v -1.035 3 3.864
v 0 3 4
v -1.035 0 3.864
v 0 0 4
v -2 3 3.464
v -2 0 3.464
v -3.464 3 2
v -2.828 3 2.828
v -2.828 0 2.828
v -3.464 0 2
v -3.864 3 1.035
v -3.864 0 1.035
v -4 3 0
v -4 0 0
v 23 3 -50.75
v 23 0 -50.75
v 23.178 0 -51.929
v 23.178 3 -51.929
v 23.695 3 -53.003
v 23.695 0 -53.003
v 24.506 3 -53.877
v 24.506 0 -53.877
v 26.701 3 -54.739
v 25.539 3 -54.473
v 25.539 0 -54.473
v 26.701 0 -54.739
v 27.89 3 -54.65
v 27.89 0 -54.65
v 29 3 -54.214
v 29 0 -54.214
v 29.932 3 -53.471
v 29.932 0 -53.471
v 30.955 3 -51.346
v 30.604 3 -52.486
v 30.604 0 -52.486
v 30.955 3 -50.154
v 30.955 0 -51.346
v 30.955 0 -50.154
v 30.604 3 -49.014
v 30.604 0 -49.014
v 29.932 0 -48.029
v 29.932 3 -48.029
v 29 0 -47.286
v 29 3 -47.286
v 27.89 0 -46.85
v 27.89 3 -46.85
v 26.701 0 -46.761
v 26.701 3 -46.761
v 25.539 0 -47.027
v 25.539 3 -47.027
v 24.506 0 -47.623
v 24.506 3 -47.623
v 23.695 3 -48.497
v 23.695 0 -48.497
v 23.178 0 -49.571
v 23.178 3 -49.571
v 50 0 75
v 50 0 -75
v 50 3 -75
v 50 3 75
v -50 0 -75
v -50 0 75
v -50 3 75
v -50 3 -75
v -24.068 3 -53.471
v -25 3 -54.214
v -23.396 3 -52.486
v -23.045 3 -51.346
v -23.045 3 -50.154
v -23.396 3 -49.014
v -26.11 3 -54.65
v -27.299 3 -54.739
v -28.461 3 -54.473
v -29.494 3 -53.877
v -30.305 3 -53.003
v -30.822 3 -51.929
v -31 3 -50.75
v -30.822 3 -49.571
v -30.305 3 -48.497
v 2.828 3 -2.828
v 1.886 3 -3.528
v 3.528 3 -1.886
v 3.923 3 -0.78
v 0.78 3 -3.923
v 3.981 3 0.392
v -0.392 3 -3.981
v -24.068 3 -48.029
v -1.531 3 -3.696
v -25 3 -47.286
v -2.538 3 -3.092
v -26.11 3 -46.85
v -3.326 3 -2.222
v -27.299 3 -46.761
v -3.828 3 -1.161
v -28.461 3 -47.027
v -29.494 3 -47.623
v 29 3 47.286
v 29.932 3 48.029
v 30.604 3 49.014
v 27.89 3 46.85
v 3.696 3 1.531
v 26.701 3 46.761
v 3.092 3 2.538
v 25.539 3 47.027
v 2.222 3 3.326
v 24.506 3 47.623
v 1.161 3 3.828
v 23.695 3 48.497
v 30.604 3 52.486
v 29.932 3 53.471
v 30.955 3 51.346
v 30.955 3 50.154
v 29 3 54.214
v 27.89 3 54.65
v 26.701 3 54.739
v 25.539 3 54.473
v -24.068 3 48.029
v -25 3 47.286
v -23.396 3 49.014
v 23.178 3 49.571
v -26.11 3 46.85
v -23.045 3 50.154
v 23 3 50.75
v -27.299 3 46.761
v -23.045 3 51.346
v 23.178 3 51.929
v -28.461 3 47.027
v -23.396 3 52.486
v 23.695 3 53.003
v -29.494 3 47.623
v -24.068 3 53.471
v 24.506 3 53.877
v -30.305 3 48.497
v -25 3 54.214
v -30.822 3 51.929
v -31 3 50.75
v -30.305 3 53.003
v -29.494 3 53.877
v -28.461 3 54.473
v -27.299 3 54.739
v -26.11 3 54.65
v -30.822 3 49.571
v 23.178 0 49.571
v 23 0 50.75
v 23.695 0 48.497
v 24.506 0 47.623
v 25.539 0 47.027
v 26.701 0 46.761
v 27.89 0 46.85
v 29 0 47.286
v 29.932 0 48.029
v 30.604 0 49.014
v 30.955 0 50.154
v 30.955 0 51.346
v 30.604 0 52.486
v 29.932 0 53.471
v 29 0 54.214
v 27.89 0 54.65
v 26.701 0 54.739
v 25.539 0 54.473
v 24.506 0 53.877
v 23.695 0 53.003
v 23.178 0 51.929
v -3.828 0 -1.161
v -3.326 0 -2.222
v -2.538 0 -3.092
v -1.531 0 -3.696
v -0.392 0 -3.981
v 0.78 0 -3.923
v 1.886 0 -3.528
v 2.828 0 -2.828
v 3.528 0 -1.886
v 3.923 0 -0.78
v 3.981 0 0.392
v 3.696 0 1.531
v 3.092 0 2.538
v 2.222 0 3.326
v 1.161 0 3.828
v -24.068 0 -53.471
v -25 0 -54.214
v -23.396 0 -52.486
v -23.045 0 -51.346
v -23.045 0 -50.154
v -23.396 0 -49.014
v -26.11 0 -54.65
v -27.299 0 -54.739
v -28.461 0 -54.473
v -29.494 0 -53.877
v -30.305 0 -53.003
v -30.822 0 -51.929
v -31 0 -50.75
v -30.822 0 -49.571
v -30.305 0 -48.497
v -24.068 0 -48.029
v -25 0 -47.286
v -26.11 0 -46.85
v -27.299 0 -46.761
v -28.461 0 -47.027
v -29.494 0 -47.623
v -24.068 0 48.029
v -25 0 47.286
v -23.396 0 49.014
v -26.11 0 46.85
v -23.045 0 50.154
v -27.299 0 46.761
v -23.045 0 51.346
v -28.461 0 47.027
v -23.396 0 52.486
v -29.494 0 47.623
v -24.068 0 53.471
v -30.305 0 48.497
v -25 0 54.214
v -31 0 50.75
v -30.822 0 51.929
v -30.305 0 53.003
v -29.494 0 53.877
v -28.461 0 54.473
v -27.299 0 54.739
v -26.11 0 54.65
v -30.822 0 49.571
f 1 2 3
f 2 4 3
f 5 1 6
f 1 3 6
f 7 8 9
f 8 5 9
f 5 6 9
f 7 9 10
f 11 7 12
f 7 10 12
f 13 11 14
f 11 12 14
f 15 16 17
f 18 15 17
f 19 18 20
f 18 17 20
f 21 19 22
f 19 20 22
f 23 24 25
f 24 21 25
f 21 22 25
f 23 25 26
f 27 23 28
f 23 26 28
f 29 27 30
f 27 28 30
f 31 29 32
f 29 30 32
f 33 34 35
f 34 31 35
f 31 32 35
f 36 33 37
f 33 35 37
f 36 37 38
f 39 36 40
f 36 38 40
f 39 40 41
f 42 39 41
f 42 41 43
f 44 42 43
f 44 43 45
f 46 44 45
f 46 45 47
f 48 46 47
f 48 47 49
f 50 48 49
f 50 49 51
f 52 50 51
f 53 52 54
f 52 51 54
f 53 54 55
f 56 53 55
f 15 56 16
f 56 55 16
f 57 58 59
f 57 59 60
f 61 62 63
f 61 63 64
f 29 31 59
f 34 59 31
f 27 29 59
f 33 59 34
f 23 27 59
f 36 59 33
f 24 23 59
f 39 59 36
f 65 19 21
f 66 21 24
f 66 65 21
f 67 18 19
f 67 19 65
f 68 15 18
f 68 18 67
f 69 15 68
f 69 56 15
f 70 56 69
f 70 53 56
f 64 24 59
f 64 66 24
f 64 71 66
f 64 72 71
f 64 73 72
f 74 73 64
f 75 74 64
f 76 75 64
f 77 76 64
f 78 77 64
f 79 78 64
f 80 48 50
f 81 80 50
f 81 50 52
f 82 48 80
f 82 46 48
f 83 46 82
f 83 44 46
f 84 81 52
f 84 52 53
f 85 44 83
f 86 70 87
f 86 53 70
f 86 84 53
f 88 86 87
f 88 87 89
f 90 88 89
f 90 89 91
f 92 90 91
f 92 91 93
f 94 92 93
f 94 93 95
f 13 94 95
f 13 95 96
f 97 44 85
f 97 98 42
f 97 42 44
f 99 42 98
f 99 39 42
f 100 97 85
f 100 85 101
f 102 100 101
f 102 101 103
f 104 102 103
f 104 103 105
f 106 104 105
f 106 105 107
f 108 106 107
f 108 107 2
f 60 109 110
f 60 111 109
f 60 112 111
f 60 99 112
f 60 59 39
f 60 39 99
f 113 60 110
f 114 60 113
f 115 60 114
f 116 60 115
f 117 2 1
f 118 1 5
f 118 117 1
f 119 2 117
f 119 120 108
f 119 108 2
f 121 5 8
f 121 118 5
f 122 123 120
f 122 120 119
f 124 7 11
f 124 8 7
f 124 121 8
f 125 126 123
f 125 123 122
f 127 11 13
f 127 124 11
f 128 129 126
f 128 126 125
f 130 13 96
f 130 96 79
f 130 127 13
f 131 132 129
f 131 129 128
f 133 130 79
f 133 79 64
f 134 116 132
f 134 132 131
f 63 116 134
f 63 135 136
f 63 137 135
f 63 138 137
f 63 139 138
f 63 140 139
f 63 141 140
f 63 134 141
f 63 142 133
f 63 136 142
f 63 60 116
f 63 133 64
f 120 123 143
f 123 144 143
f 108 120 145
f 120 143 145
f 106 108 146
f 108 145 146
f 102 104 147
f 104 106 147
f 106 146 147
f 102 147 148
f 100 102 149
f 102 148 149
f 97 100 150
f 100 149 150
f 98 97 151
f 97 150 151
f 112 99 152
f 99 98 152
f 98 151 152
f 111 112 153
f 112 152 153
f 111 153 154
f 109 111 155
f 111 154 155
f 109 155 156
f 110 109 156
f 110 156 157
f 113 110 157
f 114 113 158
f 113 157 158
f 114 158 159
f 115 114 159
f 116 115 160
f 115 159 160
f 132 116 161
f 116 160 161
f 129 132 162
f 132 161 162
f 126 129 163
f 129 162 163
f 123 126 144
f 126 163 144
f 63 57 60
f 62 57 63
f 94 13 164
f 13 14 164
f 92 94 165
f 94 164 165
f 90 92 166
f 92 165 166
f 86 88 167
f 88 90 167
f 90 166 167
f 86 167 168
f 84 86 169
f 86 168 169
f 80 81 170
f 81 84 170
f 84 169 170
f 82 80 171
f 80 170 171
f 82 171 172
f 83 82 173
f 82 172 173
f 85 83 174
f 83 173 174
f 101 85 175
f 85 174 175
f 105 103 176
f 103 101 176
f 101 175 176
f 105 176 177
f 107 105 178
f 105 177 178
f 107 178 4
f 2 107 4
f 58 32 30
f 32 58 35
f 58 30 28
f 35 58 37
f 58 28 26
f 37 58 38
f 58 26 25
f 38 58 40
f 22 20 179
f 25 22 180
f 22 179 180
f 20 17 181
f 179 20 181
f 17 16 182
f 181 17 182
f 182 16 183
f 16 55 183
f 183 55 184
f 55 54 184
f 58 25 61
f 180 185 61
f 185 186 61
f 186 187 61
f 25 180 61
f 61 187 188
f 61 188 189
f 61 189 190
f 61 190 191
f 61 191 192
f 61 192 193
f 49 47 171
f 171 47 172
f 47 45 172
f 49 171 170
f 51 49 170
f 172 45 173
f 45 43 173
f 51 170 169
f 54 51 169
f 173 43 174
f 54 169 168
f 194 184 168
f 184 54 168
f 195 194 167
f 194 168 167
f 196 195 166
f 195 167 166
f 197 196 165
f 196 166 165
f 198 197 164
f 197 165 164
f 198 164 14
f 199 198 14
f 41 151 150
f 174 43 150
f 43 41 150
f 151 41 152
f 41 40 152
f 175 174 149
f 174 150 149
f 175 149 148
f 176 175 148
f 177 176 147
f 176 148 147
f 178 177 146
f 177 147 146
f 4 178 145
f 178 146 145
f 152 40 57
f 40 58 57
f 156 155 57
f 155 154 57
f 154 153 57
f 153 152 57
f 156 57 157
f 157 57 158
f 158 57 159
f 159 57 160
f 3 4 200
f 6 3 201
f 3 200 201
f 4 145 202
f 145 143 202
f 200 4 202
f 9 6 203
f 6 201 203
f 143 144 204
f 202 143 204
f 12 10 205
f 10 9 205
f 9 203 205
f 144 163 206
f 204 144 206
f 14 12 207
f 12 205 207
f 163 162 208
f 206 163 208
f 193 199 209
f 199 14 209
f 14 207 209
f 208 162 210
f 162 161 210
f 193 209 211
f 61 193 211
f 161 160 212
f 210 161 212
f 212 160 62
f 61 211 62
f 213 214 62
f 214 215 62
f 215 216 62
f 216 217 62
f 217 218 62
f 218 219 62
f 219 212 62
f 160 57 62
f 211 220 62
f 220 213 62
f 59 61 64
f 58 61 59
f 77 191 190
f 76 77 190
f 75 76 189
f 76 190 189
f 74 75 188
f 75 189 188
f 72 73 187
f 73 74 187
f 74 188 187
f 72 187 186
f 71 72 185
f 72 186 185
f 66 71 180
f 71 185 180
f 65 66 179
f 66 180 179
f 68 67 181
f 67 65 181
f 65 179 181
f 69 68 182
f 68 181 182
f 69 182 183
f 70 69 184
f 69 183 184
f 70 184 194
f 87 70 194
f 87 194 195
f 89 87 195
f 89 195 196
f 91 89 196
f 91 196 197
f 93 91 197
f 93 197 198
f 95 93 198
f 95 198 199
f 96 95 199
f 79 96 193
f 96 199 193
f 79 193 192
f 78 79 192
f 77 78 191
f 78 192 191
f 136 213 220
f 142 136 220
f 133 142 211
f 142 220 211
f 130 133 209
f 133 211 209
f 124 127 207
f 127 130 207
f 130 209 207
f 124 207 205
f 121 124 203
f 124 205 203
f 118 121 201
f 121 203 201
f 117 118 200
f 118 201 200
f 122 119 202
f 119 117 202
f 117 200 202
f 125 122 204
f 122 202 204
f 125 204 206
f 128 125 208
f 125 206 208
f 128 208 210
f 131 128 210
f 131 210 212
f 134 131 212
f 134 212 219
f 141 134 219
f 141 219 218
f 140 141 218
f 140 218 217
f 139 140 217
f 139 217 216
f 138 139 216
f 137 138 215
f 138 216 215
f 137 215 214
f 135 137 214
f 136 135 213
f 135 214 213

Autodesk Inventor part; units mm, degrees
ref_plane "YZ Plane" through (0, 0, 0) normal (1, 0, 0) x (0, 1, 0)
ref_plane "XZ Plane" through (0, 0, 0) normal (0, 1, 0) x (-1, 0, 0)
ref_plane "XY Plane" through (0, 0, 0) normal (0, 0, 1) x (1, 0, 0)
sketch "Sketch1" plane through (0, 0, 0) normal (0, 1, 0) x (-1, 0, 0)
  line L0 (-50, 75) -> (50, 75)
  line L1 (50, 75) -> (50, -75)
  line L2 (50, -75) -> (-50, -75)
  line L3 (-50, -75) -> (-50, 75)
  circle A0 centre (27, 50.75) radius 4
  line L4 (0, 0) -> (28.2437, 0)
  line L5 (28.2437, 0) -> (0, 0)
  circle A1 centre (27, -50.75) radius 4
  line L6 (0, 0) -> (0, 34.6506)
  circle A2 centre (-27, 50.75) radius 4
  circle A3 centre (-27, -50.75) radius 4
  circle A4 centre (0, 0) radius 4
  point P0 (50, 0)
  point P1 (0, -75)
  dimension "d0" = 101.5
  dimension "d1" = 8
  dimension "d2" = 54
  dimension "d3" = 100
  dimension "d4" = 150
  dimension "d7" = 8
extrude "Extrusion1" add sketch "Sketch1" along normal blind 3
properties part number "PLACA" material "Steel, Mild, Welded"
